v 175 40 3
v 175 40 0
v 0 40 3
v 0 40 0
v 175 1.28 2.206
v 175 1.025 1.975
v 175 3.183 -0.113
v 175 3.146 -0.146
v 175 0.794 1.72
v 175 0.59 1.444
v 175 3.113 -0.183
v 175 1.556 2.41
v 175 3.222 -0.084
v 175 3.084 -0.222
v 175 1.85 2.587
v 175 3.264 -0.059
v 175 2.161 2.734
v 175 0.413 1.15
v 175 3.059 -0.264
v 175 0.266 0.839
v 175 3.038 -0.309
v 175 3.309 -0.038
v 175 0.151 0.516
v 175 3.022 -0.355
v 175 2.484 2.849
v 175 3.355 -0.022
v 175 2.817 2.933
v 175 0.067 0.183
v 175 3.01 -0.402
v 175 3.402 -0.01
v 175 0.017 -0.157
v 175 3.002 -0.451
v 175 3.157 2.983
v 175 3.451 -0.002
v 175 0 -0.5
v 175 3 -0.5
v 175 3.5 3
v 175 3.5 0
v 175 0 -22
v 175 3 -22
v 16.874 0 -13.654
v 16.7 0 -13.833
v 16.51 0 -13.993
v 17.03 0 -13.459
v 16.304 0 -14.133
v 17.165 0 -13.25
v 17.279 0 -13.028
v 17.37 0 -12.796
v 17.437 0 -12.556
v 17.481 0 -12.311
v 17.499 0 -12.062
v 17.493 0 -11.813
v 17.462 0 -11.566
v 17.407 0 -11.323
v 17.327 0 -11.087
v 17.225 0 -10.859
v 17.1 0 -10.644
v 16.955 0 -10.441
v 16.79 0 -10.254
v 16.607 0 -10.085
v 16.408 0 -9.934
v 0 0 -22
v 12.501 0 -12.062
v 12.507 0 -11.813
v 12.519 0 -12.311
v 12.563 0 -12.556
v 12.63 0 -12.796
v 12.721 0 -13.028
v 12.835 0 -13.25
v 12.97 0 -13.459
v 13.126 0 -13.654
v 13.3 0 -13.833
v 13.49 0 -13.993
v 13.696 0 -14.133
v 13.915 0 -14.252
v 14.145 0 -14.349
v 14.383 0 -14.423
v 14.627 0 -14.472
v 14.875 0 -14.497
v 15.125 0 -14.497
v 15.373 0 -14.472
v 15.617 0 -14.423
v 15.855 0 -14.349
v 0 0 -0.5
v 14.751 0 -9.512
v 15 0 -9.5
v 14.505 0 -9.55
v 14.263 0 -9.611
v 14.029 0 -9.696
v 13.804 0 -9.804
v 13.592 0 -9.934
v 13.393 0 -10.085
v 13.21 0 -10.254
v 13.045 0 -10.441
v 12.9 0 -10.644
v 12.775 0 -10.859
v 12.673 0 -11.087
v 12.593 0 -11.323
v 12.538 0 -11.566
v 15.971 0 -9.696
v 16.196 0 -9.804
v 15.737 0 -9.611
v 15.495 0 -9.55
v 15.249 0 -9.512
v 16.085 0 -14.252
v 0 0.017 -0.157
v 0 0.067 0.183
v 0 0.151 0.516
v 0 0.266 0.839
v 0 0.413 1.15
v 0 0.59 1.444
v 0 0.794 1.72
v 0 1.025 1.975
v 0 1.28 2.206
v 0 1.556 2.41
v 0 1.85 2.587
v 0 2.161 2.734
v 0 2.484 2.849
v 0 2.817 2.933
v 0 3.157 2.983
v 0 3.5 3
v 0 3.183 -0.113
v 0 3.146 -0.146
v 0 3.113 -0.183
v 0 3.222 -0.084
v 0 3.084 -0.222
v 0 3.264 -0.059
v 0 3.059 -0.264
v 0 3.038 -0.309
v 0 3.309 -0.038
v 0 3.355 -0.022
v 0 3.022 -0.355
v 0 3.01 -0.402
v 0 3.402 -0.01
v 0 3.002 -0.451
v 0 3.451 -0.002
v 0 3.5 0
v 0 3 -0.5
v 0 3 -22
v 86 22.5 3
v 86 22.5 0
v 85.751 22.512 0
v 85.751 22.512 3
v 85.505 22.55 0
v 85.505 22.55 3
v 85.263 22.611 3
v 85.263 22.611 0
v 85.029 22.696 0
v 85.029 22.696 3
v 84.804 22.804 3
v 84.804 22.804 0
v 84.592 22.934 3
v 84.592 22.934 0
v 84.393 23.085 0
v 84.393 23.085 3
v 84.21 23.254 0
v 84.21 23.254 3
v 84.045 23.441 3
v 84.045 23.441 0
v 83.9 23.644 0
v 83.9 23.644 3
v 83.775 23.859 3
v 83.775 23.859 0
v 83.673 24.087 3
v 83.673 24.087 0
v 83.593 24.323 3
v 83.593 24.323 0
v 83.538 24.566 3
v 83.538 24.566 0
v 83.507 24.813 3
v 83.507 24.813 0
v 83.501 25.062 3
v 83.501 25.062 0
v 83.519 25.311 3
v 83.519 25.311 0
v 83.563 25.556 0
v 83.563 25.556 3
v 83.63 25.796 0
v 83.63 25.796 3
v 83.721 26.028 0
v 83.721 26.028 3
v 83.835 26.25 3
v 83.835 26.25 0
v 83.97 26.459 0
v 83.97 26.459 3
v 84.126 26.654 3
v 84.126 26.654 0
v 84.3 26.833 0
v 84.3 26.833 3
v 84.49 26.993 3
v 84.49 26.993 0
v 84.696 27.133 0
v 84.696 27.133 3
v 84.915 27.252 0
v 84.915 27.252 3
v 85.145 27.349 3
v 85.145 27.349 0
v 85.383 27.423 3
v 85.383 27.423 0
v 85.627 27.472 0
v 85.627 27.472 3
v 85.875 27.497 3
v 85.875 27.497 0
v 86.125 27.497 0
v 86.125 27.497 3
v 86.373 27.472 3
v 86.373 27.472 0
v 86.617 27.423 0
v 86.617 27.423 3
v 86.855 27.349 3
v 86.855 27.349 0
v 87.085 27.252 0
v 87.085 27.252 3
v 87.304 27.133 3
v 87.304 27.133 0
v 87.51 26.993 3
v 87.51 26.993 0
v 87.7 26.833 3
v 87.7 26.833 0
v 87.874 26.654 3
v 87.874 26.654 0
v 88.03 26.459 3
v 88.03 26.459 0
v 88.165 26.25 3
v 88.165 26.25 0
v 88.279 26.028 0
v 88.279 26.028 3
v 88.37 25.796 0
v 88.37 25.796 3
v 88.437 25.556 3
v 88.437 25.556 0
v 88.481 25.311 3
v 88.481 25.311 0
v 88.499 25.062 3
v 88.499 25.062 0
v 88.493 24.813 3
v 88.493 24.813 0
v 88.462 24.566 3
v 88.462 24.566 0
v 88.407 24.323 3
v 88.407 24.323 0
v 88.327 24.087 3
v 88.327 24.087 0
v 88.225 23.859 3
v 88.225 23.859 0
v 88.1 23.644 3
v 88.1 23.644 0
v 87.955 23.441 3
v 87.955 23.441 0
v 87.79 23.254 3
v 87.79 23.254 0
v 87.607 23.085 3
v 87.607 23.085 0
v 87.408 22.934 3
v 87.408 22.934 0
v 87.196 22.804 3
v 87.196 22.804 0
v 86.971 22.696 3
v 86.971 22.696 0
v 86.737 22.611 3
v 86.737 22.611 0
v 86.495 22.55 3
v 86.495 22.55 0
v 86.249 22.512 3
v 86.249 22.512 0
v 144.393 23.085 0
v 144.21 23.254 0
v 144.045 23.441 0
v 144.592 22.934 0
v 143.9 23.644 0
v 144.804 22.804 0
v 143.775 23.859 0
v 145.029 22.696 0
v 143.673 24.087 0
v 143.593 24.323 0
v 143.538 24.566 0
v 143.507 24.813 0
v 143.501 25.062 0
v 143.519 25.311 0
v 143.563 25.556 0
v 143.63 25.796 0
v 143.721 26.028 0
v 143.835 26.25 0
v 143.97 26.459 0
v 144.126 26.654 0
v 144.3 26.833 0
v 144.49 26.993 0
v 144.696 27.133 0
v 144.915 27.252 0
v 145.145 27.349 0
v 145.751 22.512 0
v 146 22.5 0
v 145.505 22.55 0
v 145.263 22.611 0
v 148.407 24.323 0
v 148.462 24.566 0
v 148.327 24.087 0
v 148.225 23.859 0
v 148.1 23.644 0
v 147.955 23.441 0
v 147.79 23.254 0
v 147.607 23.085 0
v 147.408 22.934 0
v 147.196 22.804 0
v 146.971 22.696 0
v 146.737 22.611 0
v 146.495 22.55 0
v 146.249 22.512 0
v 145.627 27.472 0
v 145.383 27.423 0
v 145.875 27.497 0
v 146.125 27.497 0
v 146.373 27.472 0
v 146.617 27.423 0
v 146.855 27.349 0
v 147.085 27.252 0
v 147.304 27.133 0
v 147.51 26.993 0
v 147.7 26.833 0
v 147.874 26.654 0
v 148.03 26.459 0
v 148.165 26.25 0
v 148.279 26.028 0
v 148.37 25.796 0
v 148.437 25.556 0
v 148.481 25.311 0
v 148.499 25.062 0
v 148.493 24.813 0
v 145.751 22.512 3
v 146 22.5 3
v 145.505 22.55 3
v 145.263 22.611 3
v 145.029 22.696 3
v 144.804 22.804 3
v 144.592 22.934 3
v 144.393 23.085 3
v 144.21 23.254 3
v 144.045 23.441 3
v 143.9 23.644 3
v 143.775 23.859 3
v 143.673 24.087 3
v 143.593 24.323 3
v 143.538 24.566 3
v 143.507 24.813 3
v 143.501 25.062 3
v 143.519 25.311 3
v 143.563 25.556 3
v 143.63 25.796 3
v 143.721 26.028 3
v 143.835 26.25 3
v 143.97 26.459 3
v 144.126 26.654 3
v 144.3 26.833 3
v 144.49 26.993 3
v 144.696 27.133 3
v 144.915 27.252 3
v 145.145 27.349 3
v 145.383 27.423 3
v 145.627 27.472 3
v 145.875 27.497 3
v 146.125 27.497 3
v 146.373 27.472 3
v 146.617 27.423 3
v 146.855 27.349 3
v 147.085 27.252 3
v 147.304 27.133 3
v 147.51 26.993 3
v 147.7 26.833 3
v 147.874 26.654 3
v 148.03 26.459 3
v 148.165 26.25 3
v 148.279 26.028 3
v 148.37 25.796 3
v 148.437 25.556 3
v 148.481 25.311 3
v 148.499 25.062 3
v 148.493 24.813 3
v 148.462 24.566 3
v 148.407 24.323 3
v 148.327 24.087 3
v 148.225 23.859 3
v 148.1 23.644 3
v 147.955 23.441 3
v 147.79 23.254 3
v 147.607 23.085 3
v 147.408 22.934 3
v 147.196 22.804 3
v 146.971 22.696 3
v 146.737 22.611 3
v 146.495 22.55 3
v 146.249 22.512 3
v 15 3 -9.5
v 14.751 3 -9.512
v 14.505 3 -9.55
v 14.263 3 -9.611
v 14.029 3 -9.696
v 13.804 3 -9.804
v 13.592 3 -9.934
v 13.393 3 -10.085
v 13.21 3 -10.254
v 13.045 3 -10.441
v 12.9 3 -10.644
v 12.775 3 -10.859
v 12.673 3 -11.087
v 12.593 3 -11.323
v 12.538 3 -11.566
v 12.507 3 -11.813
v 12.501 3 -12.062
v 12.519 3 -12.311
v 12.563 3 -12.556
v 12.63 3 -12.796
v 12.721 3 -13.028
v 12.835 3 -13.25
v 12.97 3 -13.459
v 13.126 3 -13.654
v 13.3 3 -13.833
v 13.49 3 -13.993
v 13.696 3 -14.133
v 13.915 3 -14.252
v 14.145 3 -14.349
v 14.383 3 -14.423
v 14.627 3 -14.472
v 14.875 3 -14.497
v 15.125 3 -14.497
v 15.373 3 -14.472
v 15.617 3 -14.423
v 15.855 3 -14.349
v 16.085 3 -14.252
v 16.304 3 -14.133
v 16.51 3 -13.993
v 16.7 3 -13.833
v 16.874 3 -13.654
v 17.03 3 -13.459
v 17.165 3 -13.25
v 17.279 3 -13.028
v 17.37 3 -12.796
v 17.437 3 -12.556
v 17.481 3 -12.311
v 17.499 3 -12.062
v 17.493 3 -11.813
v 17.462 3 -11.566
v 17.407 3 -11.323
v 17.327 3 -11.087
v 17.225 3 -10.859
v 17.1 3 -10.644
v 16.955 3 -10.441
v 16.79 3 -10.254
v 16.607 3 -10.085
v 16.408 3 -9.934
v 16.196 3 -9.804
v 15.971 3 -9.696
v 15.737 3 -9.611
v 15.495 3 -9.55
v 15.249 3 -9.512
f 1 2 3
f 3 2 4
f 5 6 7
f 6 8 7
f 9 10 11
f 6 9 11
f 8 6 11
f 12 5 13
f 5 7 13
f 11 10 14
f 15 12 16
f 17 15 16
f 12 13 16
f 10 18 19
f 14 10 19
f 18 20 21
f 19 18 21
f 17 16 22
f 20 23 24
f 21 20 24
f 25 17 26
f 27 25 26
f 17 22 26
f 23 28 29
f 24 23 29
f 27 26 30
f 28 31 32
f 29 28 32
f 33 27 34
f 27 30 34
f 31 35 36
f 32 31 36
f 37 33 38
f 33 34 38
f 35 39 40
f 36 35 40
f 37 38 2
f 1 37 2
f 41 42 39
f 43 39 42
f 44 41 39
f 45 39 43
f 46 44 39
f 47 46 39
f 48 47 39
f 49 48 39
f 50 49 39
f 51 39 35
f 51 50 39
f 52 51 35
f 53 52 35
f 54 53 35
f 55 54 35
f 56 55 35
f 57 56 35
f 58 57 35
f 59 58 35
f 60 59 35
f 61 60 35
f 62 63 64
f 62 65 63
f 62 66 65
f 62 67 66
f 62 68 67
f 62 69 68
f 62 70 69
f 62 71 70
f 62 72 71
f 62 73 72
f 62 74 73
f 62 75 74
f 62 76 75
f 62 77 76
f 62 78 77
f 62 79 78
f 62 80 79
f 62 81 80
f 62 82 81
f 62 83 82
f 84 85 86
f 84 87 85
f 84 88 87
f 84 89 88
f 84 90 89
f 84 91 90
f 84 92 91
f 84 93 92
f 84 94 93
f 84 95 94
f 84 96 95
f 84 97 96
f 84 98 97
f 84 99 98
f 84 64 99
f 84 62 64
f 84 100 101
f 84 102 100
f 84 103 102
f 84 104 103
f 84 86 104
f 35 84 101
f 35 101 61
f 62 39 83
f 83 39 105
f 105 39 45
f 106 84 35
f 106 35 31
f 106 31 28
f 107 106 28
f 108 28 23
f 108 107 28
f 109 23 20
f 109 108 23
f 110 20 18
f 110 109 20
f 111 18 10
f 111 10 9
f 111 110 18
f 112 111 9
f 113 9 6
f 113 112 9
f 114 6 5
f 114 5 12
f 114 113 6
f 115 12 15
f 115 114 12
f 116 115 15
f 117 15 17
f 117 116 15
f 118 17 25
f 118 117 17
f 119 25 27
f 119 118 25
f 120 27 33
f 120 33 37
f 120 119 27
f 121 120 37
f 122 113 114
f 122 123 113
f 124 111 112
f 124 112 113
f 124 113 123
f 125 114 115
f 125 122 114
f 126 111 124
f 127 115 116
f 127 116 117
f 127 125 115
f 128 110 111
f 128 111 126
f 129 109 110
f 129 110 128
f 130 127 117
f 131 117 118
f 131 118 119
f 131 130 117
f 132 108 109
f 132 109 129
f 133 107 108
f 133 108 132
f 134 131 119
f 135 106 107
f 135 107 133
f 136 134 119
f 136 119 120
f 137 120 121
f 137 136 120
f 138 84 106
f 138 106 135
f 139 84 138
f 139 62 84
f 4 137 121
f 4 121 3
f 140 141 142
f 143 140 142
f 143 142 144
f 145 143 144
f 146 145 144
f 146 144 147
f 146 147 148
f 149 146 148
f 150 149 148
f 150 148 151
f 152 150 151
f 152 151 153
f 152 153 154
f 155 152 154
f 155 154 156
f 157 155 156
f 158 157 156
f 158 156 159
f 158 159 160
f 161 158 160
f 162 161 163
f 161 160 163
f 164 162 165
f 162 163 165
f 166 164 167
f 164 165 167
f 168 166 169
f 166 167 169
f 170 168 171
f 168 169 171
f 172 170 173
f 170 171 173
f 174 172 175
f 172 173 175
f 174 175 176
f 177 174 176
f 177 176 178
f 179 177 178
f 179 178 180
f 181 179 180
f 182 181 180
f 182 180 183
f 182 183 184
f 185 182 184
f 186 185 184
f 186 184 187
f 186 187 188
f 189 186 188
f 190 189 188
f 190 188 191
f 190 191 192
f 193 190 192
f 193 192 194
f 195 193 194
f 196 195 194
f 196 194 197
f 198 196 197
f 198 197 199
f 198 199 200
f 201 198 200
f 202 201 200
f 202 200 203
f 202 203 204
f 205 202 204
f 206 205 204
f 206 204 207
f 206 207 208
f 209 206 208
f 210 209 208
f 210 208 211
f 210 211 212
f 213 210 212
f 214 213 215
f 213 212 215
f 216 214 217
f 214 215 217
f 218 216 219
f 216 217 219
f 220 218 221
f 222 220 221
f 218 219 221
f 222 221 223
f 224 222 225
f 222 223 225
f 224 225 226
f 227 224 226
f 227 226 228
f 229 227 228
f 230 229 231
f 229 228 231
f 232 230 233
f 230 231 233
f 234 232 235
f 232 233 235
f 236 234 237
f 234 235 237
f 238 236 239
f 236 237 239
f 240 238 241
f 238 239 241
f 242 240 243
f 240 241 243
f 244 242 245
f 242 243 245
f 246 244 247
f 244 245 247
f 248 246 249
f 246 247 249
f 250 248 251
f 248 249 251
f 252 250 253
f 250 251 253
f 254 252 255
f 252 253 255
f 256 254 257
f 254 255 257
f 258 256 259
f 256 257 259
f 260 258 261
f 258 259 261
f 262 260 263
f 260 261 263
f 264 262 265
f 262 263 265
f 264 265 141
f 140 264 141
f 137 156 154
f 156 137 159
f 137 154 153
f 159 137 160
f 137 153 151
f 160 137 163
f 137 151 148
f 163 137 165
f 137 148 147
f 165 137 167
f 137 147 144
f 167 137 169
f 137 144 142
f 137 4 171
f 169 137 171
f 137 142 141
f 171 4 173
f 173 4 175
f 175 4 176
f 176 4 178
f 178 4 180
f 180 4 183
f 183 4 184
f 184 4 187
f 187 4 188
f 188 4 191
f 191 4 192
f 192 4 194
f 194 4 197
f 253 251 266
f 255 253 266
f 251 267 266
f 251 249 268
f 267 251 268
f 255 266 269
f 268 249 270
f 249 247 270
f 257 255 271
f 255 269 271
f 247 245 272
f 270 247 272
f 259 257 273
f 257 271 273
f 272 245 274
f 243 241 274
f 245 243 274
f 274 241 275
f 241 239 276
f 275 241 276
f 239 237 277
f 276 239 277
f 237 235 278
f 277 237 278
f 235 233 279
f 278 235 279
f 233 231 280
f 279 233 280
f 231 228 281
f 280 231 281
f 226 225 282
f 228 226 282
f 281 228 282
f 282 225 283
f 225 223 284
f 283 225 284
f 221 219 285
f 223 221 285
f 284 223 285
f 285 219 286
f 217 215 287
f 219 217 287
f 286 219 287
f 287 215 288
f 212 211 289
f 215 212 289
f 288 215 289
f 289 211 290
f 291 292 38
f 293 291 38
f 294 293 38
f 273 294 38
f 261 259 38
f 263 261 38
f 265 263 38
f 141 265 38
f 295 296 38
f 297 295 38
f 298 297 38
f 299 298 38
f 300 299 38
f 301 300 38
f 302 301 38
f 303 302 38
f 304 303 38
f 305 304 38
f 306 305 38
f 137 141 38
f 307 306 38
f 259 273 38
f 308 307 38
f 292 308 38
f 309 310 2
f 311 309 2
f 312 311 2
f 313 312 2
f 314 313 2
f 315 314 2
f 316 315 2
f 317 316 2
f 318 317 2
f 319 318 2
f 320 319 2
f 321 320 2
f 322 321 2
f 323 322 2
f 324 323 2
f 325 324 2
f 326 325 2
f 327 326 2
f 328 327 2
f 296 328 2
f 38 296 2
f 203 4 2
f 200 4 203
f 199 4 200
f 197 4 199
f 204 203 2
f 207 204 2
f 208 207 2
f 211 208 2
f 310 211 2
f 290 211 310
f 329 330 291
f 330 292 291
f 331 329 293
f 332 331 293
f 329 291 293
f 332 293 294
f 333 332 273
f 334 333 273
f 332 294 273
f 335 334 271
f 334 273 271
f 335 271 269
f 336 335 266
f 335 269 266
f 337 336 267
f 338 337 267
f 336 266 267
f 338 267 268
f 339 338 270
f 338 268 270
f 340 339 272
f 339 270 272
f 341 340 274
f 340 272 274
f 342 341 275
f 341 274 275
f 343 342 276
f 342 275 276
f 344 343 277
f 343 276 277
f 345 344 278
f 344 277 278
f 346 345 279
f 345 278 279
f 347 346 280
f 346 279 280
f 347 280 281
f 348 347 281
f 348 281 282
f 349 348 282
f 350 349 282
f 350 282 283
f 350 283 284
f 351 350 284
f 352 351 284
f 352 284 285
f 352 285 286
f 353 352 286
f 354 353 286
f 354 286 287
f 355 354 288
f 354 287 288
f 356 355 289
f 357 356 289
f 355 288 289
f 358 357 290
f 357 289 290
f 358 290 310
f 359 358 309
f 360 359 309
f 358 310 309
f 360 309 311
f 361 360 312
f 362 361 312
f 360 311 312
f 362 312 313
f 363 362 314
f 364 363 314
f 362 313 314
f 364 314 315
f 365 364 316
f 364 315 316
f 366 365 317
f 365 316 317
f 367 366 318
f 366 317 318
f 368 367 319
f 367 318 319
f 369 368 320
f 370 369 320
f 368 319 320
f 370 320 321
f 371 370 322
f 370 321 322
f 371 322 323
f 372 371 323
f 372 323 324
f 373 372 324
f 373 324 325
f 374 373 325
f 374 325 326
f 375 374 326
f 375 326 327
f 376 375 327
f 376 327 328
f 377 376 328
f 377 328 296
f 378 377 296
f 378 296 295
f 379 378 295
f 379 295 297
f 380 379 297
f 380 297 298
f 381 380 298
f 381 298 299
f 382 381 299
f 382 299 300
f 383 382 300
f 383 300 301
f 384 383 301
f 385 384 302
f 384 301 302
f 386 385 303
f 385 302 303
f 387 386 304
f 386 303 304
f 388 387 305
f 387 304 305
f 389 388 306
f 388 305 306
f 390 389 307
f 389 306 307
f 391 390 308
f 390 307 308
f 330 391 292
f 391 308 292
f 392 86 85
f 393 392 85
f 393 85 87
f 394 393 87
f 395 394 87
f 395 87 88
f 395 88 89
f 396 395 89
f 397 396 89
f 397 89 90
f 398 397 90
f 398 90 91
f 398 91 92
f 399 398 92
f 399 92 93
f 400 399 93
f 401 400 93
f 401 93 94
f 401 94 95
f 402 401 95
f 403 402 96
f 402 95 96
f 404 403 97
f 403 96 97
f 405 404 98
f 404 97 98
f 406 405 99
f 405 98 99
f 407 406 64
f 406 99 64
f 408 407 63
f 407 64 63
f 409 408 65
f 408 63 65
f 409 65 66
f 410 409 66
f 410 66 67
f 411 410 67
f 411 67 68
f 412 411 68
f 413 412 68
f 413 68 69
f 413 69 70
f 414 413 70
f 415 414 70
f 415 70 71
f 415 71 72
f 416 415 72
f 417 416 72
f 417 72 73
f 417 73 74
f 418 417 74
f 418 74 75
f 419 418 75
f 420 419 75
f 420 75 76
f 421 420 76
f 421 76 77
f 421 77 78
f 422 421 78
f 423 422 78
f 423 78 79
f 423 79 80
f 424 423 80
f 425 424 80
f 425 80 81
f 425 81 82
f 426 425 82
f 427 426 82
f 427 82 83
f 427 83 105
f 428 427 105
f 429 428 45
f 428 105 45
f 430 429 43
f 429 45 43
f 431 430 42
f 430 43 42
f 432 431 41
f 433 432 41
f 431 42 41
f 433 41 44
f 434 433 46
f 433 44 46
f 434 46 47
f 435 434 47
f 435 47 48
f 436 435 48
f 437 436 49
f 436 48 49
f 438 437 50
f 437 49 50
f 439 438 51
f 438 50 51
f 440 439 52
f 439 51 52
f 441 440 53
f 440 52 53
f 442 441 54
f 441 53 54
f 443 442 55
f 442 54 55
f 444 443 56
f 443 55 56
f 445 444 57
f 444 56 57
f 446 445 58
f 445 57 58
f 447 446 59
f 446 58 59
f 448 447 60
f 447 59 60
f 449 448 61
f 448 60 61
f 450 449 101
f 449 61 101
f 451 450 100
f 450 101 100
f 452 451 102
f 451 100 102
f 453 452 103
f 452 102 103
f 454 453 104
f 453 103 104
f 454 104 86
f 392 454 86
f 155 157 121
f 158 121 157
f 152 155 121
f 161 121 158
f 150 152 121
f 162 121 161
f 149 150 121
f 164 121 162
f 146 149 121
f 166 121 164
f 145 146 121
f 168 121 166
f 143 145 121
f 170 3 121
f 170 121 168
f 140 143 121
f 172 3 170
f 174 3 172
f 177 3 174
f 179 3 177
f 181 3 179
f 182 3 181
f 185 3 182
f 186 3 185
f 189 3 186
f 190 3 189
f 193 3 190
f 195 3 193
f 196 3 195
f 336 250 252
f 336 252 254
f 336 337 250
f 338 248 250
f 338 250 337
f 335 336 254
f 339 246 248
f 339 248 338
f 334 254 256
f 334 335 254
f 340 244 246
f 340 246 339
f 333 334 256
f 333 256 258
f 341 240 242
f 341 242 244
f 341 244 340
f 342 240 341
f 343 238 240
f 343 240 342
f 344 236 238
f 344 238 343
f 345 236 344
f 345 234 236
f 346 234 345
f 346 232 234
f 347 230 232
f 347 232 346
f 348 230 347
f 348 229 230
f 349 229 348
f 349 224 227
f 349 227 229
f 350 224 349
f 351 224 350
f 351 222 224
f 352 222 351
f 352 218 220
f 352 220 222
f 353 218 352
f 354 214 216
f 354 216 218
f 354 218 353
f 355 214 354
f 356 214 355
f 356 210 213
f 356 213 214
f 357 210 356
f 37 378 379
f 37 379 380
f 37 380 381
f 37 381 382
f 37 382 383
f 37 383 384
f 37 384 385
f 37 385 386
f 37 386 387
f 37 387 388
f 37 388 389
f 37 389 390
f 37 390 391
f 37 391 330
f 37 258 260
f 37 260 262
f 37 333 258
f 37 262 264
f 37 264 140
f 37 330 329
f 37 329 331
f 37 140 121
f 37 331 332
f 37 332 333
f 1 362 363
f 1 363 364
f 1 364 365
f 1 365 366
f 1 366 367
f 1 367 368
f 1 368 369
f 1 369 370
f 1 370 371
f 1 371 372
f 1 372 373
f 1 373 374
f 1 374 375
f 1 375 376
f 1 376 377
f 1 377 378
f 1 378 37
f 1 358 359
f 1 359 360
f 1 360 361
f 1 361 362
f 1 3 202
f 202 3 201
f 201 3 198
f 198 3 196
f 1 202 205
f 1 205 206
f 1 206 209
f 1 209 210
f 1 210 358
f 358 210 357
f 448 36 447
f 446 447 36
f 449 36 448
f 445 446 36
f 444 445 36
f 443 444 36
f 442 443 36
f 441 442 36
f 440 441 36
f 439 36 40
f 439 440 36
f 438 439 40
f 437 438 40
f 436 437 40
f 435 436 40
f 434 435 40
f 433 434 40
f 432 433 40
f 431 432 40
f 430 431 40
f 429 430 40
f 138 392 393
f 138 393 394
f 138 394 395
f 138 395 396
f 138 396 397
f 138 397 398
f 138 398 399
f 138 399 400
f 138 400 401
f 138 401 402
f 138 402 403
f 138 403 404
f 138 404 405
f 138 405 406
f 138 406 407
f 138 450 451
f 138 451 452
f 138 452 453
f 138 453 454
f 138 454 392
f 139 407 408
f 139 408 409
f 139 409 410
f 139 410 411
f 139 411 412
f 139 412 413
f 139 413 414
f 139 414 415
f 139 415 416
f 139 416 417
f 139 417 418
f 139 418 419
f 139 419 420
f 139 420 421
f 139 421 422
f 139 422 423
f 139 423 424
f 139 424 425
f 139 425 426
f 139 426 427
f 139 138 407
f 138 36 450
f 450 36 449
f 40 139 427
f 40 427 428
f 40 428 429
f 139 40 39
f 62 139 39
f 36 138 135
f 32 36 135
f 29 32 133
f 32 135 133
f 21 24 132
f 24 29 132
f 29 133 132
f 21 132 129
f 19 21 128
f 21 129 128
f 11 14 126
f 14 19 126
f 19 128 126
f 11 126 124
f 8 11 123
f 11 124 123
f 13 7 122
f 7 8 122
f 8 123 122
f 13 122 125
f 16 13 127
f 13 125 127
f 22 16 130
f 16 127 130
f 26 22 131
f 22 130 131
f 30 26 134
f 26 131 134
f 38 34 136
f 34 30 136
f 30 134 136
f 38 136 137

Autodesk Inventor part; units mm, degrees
ref_plane "YZ Plane" through (0, 0, 0) normal (1, 0, 0) x (0, 1, 0)
ref_plane "XZ Plane" through (0, 0, 0) normal (0, 1, 0) x (-1, 0, 0)
ref_plane "XY Plane" through (0, 0, 0) normal (0, 0, 1) x (1, 0, 0)
sketch "Sketch1" plane through (0, 0, 0) normal (0, 0, 1) x (1, 0, 0)
  line L0 (0, 0) -> (175, 0)
  line L1 (175, 0) -> (175, 40)
  line L2 (175, 40) -> (0, 40)
  line L3 (0, 40) -> (0, 0)
  dimension "d0" = 175
  dimension "d1" = 40
extrude "Plate1" add sketch "Sketch1" along normal blind 3
sketch "Sketch2" plane through (0, 3, 3) normal (0, -1, 0) x (1, 0, 0)
  line L0 (175, 0) -> (0, 0)
  line L1 (0, 0) -> (0, -25)
  line L2 (0, -25) -> (175, -25)
  line L3 (175, -25) -> (175, 0)
edge flange "Flange1" height 25 angle 90 thickness 3 bend radius 0.5 thickness toward (0, -1, 0) relief tear relief width 3 relief depth 1.5 edges at (87.5, 0, 0) wall of the first edge with corners at (175, 3, 3) (0, 3, 3) (0, 3, -22) (175, 3, -22)
bend "Bend1"
corner "Corner1"
hole "Hole3" at (146, 25, 3) direction (0, 0, -1) diameter 5 end through all
hole "Hole4" at (86, 25, 3) direction (0, 0, -1) diameter 5 end through all
hole "Hole5" at (15, 3, -12) direction (0, -1, 0) diameter 5 end through all
equation "\"d38\" = Thickness"
equation "\"d47\" = Thickness"
equation "\"d56\" = Thickness"
equation "\"d3\" = BendReliefWidth"
equation "\"d4\" = BendReliefDepth"
equation "\"d5\" = MinimumRemnant"
equation "\"d6\" = BendRadius"
equation "\"d10\" = CornerReliefSize"
equation "\"d11\" = GapSize"
equation "\"d12\" = JacobiRadiusSize"
equation "\"BendRadius\" = Thickness"
equation "\"BendReliefWidth\" = Thickness"
equation "\"BendReliefDepth\" = 0.5 * Thickness"
equation "\"CornerReliefSize\" = 4 * Thickness"
equation "\"MinimumRemnant\" = 2 * Thickness"
equation "\"TransitionRadius\" = BendRadius"
equation "\"JacobiRadiusSize\" = BendRadius"
equation "\"GapSize\" = Thickness"
equation "\"d2\" = BendRadius"
equation "\"Thickness\" = 3"
properties part number "endcapOptionLeftAngle" material "Aluminum 6061"
